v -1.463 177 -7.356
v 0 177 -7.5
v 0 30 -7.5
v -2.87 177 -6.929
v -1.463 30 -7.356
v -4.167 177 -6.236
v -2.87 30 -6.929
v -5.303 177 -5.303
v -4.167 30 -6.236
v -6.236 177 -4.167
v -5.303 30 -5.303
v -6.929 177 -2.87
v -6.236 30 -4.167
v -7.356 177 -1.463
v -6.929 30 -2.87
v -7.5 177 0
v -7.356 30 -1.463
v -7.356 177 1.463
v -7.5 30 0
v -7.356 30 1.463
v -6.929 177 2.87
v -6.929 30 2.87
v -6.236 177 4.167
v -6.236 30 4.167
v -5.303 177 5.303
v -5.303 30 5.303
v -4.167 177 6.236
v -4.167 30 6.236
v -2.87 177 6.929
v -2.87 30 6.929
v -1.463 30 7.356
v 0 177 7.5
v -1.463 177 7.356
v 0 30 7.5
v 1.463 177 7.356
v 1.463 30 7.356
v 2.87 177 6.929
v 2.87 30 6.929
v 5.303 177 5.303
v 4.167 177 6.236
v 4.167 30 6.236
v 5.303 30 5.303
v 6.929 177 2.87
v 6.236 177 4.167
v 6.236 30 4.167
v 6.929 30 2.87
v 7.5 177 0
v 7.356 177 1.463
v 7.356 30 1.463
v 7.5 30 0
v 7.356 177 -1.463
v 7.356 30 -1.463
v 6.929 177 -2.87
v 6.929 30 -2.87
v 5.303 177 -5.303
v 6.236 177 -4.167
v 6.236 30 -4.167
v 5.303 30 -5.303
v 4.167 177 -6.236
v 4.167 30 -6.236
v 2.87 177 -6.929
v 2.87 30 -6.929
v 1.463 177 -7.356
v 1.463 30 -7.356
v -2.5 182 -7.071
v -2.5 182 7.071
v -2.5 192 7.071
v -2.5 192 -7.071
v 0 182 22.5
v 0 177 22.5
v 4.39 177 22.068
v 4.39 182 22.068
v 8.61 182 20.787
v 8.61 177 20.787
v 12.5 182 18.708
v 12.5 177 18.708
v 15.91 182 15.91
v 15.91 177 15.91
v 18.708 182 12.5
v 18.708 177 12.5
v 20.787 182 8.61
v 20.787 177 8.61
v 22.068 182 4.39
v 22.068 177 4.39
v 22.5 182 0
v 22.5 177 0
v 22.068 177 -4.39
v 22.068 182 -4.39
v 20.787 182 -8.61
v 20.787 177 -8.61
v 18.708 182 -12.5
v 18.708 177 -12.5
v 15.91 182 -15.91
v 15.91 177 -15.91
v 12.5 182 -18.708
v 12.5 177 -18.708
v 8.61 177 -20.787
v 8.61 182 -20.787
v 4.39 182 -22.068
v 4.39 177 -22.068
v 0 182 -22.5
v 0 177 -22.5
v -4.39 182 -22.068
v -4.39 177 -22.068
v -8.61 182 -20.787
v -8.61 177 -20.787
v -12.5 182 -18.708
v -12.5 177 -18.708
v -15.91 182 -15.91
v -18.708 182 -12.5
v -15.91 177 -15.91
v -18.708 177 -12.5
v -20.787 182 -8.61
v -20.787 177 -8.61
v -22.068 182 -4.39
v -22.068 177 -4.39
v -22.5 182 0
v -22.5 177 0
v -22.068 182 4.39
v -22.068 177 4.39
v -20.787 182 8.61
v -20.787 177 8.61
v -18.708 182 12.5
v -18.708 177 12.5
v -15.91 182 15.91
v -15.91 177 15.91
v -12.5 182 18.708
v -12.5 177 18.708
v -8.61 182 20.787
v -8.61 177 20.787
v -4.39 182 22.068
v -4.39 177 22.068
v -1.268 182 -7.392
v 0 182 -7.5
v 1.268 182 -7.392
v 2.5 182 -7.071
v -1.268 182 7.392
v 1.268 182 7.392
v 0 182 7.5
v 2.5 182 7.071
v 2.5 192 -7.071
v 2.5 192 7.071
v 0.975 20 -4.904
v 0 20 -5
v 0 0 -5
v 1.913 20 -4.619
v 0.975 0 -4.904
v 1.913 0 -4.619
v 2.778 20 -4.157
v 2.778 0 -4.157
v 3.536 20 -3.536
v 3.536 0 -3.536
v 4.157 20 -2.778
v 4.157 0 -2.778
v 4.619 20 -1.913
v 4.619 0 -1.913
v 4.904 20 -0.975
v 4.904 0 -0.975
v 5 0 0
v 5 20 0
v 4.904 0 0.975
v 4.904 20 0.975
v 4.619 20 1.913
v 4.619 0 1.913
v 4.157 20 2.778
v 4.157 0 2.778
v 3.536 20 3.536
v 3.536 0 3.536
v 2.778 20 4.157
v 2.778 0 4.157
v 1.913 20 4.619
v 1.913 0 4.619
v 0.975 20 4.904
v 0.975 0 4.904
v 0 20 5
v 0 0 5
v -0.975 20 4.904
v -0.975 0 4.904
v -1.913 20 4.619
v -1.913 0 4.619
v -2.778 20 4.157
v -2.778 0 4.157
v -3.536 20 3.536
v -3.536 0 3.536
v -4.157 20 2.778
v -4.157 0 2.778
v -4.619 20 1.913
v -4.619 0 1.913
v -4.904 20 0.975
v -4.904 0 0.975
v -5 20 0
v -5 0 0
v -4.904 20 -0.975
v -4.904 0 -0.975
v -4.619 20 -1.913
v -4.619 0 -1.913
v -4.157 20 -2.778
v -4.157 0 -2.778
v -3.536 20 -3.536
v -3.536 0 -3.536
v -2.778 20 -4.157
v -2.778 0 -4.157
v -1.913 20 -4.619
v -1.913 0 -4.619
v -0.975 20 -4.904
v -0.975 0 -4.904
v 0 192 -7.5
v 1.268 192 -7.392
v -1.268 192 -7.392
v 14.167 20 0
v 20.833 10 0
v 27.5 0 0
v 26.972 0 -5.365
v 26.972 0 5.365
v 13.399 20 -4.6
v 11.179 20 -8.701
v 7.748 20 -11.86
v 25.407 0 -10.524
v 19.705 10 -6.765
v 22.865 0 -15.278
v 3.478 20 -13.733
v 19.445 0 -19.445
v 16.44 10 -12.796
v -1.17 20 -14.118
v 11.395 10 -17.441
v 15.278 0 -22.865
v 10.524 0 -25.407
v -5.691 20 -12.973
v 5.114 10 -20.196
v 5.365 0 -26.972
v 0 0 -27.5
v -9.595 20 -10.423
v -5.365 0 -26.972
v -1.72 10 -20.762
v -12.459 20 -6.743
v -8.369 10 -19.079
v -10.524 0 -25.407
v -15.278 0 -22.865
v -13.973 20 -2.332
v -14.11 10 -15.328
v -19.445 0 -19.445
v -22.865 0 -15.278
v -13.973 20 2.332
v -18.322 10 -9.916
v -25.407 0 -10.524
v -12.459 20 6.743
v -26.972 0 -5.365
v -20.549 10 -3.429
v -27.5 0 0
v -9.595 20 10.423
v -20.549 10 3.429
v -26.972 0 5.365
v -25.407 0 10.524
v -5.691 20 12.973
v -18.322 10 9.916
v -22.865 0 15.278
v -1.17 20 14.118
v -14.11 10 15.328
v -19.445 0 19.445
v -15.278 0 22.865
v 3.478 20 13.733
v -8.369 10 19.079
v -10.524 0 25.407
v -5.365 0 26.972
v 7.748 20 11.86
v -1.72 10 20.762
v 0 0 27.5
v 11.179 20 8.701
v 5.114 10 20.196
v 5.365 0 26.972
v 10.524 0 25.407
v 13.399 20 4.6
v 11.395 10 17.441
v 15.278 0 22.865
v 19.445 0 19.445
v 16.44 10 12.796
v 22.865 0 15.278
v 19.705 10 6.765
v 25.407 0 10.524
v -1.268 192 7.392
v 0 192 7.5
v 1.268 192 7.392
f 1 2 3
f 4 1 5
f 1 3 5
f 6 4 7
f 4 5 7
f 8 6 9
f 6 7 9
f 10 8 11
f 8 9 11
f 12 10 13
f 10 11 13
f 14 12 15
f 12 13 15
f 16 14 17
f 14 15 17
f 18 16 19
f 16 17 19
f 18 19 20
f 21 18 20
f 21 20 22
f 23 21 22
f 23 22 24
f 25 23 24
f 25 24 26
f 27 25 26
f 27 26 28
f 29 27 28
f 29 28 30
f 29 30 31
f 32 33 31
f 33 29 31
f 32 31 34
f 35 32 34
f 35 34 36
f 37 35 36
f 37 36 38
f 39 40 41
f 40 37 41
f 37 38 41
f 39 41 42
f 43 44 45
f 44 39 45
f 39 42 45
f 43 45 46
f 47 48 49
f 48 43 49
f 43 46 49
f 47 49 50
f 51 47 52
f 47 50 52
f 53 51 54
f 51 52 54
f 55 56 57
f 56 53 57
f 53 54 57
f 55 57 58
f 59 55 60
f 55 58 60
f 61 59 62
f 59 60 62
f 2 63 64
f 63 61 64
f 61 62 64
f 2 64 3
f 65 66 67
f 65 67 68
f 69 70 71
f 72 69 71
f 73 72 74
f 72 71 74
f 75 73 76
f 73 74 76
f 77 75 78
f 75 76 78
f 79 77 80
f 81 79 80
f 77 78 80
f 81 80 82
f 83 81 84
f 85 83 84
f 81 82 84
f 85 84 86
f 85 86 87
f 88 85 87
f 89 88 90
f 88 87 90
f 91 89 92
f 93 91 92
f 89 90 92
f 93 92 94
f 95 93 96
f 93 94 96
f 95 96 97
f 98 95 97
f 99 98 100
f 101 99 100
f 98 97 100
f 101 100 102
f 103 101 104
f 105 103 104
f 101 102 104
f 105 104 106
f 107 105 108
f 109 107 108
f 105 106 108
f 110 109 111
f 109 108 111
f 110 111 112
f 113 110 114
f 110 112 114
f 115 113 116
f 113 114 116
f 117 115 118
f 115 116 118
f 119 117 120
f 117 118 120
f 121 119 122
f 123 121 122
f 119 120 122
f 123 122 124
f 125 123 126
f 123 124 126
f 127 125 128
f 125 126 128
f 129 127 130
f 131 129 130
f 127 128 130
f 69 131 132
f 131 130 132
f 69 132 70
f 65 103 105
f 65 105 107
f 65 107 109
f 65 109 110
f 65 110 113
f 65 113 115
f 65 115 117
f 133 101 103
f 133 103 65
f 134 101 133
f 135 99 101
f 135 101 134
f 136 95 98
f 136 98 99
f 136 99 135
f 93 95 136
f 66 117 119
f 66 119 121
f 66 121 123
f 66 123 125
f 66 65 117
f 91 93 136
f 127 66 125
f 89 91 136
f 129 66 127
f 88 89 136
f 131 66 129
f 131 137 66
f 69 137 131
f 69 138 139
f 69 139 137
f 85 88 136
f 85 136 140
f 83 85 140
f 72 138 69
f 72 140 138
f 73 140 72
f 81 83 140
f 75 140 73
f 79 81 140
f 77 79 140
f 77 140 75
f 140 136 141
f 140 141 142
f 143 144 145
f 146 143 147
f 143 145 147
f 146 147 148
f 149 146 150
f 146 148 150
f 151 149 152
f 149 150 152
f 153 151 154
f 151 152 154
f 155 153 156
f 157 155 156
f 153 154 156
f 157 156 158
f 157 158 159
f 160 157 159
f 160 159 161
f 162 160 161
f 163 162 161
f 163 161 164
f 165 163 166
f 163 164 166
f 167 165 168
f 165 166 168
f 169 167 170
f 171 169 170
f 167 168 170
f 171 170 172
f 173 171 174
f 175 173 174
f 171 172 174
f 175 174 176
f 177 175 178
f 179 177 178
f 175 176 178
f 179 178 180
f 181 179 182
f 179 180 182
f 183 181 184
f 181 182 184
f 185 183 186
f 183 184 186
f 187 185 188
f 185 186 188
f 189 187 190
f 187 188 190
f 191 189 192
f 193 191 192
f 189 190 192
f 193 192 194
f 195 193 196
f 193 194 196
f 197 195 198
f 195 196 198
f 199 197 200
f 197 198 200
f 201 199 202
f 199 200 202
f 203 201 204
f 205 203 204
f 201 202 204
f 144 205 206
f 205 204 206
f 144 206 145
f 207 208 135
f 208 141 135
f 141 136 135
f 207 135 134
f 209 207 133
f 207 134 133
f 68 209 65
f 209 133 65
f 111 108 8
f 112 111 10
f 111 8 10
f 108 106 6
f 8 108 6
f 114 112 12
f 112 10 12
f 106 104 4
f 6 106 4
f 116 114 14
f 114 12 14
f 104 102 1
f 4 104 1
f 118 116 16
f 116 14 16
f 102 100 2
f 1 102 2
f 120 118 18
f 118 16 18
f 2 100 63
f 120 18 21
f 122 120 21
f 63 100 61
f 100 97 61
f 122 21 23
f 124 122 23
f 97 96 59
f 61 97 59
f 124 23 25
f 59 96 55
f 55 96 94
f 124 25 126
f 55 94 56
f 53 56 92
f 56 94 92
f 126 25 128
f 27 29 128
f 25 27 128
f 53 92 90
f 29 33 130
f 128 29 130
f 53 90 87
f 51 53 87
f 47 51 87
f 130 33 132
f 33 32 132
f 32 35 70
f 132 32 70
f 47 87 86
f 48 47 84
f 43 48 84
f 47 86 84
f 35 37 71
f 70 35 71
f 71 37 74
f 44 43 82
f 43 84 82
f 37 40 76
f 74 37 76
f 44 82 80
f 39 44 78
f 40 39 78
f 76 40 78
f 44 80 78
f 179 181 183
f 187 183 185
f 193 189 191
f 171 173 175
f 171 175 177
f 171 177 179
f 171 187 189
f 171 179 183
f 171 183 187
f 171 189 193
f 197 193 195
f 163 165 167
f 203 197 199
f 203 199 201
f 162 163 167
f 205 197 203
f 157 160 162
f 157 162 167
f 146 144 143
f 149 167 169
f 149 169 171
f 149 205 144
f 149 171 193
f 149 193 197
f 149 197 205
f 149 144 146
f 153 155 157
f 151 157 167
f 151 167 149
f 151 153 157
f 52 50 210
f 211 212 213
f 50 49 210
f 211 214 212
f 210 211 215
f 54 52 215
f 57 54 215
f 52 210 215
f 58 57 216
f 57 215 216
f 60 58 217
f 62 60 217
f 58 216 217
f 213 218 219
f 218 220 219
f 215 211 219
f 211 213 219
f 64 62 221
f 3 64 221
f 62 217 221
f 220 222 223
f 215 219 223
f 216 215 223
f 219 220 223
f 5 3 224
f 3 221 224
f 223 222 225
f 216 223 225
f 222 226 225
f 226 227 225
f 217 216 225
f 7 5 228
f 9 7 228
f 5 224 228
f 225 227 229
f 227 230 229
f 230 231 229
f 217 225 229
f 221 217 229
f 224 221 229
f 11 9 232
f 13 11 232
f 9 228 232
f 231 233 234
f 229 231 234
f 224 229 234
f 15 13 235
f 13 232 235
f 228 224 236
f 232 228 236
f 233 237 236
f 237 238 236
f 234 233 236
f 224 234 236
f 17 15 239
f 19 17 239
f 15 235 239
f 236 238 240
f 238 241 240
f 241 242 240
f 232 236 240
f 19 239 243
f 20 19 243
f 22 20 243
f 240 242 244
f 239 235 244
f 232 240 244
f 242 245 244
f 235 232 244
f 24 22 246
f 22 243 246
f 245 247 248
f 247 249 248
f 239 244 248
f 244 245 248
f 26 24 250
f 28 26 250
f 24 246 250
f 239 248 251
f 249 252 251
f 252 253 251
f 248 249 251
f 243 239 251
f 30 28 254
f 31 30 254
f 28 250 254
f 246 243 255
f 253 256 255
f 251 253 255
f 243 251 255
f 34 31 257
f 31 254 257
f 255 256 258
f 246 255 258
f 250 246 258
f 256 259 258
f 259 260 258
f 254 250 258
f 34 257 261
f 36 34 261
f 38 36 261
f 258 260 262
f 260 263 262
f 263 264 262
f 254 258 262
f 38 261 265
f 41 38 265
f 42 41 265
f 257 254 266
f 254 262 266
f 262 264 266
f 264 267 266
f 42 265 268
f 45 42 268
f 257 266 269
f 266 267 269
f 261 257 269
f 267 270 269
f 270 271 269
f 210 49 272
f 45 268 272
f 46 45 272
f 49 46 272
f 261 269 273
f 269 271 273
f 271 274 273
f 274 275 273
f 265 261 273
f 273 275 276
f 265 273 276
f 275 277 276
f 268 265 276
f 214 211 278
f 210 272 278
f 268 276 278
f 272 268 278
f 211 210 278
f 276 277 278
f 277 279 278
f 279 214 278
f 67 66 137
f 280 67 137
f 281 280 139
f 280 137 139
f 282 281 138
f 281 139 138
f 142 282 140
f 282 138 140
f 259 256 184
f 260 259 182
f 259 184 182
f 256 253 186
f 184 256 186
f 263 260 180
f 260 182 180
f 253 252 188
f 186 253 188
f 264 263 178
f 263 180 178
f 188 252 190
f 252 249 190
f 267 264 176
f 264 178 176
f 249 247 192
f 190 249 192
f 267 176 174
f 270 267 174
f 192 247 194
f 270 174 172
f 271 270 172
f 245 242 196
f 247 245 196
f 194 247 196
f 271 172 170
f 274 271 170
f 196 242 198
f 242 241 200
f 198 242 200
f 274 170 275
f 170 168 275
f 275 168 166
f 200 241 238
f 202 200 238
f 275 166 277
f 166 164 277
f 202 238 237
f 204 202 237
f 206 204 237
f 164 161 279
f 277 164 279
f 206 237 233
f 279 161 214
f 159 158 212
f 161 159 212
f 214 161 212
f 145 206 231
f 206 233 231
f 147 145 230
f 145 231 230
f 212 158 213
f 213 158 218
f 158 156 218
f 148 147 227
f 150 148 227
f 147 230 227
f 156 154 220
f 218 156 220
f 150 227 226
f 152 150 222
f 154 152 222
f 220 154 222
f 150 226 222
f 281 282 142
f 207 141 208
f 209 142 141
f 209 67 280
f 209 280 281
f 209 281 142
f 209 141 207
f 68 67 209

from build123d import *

# Parameters (mm, degrees)
SKETCH2_R           = 7.5
SKETCH1_R           = 27.5
SKETCH2_2_R         = 7.5
BOSS_EXTRUDE1_DEPTH = 162
SKETCH3_R           = 22.5
BOSS_EXTRUDE2_DEPTH = 5
CUT_EXTRUDE3_START  = -10
CUT_EXTRUDE3_DEPTH  = 10
SKETCH21_R          = 5
CUT_EXTRUDE4_DEPTH  = 20


with BuildPart() as part:
    # Sketch2 → Loft1 section 0
    with BuildSketch(Plane(origin=(0, 30, 0), x_dir=(1, 0, 0), z_dir=(0, 1, 0))):
        Circle(SKETCH2_R)
    # Sketch1 → Loft1 section 1
    with BuildSketch(Plane(origin=(0, 0, 0), x_dir=(1, 0, 0), z_dir=(0, 1, 0))):
        Circle(SKETCH1_R)
    loft()

    # Sketch2<2> → Boss-Extrude1 (add)
    with BuildSketch(Plane(origin=(0, 30, 0), x_dir=(1, 0, 0), z_dir=(0, 1, 0))):
        with Locations(Location((0, 0, 0), (0, 0, 90))):
            Circle(SKETCH2_2_R)
    extrude(amount=BOSS_EXTRUDE1_DEPTH)

    # Sketch3 → Boss-Extrude2 (add)
    with BuildSketch(Plane(origin=(0, 177, 0), x_dir=(1, 0, 0), z_dir=(0, 1, 0))):
        with Locations(Location((0, 0, 0), (0, 0, 270))):
            Circle(SKETCH3_R)
    extrude(amount=BOSS_EXTRUDE2_DEPTH)

    # Sketch5 → Cut-Extrude3 (cut)
    with BuildSketch(Plane(origin=(0, 192, 0), x_dir=(1, 0, 0), z_dir=(0, 1, 0)).offset(CUT_EXTRUDE3_START)):
        with BuildLine():
            ThreePointArc((7.5, 0), (6.123724357, 4.330127019), (2.5, 7.071067812))
            Line((2.5, 7.071067812), (2.5, -7.071067812))
            ThreePointArc((2.5, -7.071067812), (6.123724357, -4.330127019), (7.5, 0))
        make_face()
        with BuildLine():
            Line((-2.5, -7.071067812), (-2.5, 7.071067812))
            ThreePointArc((-2.5, 7.071067812), (-7.5, 0), (-2.5, -7.071067812))
        make_face()
    extrude(amount=CUT_EXTRUDE3_DEPTH, mode=Mode.SUBTRACT)

    # Sketch21 → Cut-Extrude4 (cut)
    with BuildSketch(Plane.XZ):
        with Locations(Location((0, 0, 0), (0, 0, 270))):
            Circle(SKETCH21_R)
    extrude(amount=-CUT_EXTRUDE4_DEPTH, mode=Mode.SUBTRACT)


solid = part.part
